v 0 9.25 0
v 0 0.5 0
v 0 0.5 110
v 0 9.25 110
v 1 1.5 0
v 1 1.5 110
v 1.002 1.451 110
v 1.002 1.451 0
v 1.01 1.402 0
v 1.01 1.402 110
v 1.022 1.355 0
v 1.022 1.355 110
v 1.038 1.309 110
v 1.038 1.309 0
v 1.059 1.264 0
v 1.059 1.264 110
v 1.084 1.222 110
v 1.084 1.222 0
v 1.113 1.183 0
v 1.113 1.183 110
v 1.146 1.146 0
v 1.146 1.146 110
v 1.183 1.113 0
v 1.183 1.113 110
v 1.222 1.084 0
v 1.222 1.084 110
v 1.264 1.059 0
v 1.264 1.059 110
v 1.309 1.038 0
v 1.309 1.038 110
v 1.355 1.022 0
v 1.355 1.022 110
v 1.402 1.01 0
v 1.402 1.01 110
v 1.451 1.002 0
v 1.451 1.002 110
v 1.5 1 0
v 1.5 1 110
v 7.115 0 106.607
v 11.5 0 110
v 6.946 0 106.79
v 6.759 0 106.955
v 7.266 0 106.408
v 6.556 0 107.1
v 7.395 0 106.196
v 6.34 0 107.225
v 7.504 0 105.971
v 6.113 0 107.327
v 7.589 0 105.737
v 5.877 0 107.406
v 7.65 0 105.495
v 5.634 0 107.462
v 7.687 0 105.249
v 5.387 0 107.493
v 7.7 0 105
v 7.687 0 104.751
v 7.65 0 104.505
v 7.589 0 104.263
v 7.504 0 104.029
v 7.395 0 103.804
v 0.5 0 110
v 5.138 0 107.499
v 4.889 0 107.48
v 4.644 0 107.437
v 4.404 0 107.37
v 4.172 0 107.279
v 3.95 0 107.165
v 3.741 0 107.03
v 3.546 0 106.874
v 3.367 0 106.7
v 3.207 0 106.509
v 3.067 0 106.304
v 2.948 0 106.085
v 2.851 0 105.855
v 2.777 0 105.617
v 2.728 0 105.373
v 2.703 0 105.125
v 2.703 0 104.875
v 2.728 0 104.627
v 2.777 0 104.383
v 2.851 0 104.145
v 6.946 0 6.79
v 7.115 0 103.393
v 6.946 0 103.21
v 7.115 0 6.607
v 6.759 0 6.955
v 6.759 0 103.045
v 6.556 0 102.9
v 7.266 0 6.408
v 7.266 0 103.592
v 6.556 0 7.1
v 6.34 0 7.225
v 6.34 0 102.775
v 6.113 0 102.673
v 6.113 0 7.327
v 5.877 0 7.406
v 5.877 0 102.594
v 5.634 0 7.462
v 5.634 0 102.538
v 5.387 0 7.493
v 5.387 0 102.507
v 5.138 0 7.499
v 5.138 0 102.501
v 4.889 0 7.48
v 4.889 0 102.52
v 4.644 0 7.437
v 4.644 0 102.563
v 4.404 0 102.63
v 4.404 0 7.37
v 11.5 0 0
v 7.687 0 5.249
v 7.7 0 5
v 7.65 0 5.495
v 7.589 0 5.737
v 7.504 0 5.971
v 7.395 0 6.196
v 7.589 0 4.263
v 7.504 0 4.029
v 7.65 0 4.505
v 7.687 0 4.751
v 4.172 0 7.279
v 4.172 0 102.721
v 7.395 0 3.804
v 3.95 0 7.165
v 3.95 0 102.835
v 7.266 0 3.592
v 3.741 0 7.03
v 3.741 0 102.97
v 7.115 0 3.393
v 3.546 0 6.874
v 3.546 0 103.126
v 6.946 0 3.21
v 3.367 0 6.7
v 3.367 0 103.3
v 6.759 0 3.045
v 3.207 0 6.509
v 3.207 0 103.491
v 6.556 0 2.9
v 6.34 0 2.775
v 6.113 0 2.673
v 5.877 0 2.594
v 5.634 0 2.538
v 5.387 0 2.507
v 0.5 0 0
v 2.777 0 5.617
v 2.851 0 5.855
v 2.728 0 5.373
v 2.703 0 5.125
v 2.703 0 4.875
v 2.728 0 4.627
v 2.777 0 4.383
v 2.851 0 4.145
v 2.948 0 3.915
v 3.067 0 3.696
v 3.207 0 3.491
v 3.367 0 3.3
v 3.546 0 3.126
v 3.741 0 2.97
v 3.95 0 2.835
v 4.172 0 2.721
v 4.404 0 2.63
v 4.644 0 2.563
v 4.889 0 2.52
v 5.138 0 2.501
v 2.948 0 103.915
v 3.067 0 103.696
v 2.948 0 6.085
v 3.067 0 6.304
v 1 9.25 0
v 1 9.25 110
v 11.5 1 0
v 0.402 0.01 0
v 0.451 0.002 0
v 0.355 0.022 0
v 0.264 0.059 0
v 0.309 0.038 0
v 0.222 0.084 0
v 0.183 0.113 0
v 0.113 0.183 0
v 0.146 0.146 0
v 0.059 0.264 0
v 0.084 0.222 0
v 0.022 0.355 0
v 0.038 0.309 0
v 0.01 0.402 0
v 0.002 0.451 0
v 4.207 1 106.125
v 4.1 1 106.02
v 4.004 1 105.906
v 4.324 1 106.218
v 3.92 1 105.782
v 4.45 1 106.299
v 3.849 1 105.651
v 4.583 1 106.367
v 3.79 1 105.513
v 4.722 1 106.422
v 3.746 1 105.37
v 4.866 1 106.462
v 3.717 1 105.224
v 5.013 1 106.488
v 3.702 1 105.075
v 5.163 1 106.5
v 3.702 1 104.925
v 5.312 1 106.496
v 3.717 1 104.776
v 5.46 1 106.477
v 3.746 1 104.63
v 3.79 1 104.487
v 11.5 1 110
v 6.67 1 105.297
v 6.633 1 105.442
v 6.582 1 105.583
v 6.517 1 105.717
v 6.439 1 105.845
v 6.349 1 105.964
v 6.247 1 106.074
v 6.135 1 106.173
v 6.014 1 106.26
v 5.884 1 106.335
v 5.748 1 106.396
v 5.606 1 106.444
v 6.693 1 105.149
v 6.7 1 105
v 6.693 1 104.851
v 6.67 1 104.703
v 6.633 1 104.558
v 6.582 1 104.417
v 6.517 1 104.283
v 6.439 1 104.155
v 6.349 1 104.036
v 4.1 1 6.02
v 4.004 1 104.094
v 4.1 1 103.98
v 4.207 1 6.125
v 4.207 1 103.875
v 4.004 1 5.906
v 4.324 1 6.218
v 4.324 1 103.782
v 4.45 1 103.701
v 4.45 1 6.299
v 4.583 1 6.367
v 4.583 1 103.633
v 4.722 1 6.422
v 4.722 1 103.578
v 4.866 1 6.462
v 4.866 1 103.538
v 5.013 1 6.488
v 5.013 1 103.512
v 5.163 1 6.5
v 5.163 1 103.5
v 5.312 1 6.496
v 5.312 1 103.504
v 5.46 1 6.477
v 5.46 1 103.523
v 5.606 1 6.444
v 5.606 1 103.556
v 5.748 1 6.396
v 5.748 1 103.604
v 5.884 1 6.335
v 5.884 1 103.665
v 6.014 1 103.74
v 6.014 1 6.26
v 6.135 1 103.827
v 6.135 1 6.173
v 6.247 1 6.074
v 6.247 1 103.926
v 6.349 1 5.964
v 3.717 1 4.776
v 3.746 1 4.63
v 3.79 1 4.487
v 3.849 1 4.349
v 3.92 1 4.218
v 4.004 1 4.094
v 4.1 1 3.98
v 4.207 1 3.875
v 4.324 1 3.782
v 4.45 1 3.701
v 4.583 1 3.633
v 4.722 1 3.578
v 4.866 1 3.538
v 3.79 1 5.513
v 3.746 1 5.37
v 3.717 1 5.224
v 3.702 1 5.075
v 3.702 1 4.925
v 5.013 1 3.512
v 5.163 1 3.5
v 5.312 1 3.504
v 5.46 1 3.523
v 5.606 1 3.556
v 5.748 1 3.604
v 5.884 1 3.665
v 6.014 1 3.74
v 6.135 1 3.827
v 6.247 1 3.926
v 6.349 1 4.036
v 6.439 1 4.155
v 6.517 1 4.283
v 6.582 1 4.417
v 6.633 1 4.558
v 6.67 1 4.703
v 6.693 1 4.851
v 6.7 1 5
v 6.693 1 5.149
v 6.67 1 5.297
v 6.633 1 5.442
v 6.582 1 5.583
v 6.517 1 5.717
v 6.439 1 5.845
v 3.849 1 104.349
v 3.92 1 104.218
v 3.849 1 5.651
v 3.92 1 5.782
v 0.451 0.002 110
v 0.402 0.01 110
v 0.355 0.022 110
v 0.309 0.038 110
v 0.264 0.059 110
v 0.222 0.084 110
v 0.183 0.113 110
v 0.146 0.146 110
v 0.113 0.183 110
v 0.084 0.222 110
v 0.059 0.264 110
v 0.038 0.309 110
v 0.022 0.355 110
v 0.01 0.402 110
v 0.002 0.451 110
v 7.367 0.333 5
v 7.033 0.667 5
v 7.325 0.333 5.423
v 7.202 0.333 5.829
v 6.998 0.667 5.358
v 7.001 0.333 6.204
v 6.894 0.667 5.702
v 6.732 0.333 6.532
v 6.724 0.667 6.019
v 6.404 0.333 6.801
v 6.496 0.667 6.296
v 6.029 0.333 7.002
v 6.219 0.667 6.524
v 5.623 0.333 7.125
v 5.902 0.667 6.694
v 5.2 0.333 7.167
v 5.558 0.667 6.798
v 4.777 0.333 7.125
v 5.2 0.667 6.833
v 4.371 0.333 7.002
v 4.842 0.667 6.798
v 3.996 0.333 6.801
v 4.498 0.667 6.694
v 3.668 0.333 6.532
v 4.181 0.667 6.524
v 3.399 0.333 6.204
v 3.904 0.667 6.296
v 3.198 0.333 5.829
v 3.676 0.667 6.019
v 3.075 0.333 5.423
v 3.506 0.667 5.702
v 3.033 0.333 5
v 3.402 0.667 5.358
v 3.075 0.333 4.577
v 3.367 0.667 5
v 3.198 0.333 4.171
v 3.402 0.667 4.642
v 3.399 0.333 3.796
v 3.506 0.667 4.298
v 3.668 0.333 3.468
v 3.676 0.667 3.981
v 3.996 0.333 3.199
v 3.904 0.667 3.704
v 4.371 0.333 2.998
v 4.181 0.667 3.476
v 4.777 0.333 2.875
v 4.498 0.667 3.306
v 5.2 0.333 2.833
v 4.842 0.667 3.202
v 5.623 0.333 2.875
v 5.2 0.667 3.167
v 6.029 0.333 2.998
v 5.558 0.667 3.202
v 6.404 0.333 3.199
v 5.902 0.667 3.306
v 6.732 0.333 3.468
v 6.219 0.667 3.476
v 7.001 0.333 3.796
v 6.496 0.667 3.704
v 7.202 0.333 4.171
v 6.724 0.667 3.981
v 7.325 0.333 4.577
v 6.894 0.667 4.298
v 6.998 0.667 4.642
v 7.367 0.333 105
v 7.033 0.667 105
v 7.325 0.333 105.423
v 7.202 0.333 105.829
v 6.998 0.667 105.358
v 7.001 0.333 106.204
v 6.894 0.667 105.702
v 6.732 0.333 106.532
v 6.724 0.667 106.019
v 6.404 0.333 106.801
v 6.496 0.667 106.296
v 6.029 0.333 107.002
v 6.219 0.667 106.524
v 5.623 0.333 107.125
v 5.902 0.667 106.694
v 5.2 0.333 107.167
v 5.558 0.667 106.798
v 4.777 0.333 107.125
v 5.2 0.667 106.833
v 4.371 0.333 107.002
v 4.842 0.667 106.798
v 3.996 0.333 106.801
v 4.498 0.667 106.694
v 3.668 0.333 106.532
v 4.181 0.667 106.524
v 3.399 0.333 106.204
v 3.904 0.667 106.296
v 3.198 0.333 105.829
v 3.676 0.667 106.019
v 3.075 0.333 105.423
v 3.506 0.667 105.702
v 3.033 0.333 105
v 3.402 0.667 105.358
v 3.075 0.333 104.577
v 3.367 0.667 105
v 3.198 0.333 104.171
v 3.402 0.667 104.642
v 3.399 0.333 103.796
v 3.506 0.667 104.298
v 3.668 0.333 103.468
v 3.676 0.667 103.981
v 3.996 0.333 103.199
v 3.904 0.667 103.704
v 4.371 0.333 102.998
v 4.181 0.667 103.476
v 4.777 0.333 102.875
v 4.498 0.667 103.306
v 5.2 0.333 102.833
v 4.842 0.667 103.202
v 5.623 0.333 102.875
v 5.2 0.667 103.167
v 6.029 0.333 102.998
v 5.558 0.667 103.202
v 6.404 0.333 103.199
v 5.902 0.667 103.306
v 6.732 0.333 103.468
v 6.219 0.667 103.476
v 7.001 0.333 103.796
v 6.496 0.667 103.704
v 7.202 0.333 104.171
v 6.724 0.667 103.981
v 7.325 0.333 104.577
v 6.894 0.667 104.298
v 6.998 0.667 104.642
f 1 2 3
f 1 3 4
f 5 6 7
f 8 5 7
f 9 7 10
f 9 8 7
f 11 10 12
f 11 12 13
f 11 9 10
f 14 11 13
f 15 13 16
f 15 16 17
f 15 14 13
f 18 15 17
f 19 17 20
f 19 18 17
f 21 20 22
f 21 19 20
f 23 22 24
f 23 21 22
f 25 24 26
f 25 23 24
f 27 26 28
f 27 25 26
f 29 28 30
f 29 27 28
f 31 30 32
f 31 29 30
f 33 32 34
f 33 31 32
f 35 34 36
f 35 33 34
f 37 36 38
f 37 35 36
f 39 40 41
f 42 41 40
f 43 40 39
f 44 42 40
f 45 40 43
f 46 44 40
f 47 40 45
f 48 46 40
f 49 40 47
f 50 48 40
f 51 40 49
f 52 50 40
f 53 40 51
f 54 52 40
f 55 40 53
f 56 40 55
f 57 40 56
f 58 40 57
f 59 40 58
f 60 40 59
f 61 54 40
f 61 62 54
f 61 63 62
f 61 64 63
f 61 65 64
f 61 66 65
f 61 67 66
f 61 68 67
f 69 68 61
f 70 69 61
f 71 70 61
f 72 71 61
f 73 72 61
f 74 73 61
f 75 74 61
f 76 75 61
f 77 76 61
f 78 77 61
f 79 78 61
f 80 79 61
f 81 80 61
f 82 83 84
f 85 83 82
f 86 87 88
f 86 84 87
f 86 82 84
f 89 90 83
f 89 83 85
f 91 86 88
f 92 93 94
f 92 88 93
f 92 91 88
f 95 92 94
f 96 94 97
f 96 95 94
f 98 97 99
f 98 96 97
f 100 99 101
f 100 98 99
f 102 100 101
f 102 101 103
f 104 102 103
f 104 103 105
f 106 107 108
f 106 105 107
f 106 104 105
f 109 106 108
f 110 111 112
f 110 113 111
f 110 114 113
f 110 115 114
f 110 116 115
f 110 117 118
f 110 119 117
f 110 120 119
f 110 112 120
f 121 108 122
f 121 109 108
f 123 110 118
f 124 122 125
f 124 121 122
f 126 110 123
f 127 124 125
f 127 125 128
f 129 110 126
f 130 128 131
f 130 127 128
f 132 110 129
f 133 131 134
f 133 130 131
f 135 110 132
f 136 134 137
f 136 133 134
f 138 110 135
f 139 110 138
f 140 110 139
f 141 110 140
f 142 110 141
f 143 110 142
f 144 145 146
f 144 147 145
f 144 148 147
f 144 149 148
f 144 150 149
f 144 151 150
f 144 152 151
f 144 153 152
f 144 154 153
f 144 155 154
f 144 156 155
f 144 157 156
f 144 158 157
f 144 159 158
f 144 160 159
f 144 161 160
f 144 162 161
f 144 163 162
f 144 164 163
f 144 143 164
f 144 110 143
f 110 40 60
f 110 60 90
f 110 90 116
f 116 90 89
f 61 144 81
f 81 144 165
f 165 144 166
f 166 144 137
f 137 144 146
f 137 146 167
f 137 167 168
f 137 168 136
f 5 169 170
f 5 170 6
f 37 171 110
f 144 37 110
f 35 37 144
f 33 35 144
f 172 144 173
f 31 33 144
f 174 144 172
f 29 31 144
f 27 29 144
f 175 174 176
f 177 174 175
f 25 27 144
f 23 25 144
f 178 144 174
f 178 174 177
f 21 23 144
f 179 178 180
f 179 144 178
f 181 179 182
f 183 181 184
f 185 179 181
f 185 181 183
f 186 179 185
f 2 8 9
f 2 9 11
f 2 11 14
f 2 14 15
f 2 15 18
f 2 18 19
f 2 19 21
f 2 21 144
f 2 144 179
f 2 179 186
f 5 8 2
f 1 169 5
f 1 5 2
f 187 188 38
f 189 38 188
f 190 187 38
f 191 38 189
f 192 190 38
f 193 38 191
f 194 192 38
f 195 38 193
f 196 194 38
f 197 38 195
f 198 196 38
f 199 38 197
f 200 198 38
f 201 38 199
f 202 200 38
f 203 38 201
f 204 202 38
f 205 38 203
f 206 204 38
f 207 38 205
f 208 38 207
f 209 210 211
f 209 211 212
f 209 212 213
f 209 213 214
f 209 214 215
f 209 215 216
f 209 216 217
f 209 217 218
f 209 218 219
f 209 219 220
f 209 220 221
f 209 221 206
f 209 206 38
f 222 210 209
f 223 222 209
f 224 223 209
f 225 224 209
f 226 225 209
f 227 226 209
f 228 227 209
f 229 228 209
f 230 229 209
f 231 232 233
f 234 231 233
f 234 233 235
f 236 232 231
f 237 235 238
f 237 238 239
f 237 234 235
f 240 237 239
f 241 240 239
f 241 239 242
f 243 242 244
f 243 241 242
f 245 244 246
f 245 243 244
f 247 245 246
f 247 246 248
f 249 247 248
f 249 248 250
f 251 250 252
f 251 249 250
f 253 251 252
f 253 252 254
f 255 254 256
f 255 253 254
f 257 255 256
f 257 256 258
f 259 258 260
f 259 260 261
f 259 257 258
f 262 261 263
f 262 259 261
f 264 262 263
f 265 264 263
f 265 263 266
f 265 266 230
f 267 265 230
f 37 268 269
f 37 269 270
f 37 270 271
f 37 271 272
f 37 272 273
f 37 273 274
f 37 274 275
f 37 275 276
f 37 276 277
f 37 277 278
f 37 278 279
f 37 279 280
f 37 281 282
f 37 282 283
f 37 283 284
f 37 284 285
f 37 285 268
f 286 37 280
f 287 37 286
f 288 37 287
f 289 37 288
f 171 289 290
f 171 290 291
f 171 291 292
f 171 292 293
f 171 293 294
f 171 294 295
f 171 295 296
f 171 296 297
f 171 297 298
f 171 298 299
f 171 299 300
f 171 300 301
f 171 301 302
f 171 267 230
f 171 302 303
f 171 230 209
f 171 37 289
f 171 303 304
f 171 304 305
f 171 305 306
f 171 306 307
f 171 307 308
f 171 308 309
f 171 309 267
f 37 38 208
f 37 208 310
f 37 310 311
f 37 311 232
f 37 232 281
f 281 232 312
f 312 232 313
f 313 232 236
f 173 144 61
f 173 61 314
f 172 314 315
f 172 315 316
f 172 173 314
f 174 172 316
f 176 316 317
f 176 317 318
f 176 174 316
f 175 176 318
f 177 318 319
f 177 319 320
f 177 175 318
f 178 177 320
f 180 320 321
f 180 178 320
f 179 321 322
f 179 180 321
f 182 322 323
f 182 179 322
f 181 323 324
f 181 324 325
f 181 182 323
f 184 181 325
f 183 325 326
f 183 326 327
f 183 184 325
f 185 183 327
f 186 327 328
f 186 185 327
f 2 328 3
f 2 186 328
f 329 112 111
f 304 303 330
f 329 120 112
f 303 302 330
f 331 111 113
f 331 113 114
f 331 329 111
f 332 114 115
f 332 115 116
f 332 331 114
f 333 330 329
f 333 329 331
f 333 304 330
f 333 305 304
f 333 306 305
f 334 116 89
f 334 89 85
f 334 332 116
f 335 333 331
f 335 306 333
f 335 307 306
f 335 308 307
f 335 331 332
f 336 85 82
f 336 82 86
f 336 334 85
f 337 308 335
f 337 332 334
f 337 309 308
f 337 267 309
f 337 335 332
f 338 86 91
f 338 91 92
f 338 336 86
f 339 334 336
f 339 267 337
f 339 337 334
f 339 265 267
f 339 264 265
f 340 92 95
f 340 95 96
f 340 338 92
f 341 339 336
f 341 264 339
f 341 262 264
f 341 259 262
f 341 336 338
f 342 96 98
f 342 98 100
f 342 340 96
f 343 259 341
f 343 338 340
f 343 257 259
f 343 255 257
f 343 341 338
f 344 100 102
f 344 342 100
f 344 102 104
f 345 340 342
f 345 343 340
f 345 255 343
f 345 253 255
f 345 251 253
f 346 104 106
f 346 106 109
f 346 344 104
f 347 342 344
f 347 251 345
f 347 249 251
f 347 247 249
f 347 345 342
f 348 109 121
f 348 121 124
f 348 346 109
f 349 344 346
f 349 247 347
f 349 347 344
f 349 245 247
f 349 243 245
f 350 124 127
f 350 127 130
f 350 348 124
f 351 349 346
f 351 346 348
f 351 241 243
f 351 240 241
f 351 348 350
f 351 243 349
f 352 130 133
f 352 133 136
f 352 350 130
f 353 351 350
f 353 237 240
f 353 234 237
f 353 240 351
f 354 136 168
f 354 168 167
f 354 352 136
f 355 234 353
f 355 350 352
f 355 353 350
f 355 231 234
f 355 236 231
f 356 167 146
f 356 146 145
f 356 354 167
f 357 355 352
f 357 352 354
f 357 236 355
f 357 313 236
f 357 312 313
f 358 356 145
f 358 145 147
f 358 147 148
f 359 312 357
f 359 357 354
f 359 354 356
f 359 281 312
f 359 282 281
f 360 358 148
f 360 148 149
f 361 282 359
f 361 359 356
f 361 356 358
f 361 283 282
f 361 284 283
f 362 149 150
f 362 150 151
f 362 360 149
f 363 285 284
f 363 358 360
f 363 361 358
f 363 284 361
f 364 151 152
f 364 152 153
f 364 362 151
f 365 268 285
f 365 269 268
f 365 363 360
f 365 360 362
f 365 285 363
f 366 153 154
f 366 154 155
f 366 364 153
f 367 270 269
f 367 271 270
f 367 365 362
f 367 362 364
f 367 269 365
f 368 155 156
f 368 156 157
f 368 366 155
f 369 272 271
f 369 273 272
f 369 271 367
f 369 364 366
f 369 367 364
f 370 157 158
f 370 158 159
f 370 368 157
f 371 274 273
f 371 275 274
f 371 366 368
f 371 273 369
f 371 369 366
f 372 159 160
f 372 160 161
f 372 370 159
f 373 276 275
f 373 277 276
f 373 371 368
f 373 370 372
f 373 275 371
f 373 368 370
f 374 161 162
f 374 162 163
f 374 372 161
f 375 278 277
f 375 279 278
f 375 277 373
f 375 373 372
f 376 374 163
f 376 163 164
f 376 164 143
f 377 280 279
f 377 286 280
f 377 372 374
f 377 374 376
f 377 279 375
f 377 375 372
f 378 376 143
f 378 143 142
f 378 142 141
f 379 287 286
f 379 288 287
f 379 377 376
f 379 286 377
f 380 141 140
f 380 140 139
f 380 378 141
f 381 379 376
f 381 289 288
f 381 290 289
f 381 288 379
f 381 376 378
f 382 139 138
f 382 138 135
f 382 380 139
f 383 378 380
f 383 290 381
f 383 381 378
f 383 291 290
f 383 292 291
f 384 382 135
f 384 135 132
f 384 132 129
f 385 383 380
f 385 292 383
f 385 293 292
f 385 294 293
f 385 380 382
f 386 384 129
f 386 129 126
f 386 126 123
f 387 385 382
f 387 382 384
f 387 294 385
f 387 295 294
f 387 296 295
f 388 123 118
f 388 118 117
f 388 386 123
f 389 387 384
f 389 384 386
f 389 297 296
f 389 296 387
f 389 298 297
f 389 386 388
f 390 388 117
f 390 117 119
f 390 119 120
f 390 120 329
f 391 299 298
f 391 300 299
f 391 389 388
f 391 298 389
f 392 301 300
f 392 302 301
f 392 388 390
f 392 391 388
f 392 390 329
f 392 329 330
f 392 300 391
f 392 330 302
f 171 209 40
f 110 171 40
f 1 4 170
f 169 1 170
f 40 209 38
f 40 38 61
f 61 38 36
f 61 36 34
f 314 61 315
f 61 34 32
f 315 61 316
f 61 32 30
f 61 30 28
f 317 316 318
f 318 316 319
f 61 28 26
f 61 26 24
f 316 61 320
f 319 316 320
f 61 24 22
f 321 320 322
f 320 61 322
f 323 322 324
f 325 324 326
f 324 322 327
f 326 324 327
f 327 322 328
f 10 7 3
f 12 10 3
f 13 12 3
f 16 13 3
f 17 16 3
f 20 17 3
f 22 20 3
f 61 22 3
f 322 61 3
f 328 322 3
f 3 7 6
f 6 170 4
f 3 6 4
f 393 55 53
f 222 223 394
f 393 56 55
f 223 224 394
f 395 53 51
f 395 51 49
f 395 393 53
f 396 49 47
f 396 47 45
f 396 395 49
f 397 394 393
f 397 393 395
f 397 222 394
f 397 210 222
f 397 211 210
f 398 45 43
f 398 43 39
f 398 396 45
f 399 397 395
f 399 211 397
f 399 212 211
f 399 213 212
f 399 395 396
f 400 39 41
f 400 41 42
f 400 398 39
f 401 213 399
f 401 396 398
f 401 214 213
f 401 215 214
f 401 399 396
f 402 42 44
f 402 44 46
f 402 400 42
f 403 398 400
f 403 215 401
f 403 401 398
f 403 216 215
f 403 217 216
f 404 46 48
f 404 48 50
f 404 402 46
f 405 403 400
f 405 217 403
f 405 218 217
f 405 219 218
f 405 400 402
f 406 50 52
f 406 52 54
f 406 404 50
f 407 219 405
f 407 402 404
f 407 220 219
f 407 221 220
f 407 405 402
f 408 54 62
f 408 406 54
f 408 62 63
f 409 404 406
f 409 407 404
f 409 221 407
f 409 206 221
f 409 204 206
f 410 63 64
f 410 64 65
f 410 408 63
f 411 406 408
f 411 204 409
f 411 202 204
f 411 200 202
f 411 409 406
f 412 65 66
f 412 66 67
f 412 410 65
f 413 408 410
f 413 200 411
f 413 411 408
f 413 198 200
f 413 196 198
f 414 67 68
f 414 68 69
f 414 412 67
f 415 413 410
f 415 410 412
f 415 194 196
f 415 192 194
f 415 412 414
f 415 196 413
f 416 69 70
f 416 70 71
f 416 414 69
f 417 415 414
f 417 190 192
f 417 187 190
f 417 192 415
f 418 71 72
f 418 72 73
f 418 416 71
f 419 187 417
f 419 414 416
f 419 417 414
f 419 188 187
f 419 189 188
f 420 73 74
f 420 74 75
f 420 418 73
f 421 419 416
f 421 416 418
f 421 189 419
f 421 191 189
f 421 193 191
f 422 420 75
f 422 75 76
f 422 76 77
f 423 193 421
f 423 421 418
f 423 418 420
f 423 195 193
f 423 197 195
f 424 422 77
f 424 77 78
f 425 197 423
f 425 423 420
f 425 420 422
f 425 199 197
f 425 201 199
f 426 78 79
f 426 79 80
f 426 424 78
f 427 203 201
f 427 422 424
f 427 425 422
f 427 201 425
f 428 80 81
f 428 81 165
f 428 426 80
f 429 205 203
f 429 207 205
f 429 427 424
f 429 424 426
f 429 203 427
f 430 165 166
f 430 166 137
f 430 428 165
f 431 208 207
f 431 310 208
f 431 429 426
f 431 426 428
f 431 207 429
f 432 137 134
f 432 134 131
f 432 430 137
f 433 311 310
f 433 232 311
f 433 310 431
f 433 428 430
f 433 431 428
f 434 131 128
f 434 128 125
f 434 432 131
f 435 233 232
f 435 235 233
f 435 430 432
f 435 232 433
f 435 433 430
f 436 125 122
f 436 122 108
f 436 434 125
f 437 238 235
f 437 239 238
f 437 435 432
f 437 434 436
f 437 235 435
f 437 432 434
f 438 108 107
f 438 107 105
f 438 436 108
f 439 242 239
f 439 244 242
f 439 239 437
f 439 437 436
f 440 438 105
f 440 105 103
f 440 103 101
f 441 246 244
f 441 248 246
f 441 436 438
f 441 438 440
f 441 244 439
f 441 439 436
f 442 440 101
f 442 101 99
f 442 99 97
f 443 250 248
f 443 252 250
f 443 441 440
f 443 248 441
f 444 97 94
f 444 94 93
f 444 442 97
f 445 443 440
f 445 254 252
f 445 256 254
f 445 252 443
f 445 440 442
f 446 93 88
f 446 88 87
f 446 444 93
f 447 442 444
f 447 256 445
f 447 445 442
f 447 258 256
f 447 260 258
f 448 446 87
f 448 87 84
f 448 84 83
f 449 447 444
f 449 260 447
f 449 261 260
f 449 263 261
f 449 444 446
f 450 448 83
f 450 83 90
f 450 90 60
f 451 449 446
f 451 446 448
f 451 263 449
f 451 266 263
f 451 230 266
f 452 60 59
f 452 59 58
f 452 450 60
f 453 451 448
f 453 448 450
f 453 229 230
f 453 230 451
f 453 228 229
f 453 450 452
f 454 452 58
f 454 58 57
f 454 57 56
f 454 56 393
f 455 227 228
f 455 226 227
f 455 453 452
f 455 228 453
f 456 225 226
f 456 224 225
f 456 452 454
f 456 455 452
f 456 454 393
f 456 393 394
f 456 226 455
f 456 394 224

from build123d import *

# Parameters (mm, degrees)
BOSS_EXTRU_1_DEPTH      = 110
ESQUISSE2_R             = 1.5
ENL_V_MAT_EXTRU_1_DEPTH = 5
CHANFREIN1_SIZE         = 1


with BuildPart() as part:
    # Esquisse1 → Boss.-Extru.1 (new body)
    with BuildSketch(Plane.XY):
        with BuildLine():
            Line((0, 0.5), (0, 9.25))
            Line((0, 9.25), (1, 9.25))
            Line((1, 9.25), (1, 1.5))
            ThreePointArc((1, 1.5), (1.146446609, 1.146446609), (1.5, 1))
            Line((1.5, 1), (11.5, 1))
            Line((11.5, 1), (11.5, 0))
            Line((11.5, 0), (0.5, 0))
            ThreePointArc((0.5, 0), (0.146446609, 0.146446609), (0, 0.5))
        make_face()
    extrude(amount=BOSS_EXTRU_1_DEPTH)

    # Esquisse2 → Enlèv. mat.-Extru.1 (cut)
    with BuildSketch(Plane.XZ):
        with Locations((5.2, 5)):
            Circle(ESQUISSE2_R)
        with Locations((5.2, 105)):
            Circle(ESQUISSE2_R)
    extrude(amount=-ENL_V_MAT_EXTRU_1_DEPTH, mode=Mode.SUBTRACT)

    # Chanfrein1
    chanfrein1_edges = [part.edges().sort_by_distance(p)[0] for p in [
        (3.7, 0, 5),
        (3.7, 0, 105),
    ]]
    chamfer(chanfrein1_edges, length=CHANFREIN1_SIZE - 0.0001)  # a hair under: the kernel refuses the full size


solid = part.part
